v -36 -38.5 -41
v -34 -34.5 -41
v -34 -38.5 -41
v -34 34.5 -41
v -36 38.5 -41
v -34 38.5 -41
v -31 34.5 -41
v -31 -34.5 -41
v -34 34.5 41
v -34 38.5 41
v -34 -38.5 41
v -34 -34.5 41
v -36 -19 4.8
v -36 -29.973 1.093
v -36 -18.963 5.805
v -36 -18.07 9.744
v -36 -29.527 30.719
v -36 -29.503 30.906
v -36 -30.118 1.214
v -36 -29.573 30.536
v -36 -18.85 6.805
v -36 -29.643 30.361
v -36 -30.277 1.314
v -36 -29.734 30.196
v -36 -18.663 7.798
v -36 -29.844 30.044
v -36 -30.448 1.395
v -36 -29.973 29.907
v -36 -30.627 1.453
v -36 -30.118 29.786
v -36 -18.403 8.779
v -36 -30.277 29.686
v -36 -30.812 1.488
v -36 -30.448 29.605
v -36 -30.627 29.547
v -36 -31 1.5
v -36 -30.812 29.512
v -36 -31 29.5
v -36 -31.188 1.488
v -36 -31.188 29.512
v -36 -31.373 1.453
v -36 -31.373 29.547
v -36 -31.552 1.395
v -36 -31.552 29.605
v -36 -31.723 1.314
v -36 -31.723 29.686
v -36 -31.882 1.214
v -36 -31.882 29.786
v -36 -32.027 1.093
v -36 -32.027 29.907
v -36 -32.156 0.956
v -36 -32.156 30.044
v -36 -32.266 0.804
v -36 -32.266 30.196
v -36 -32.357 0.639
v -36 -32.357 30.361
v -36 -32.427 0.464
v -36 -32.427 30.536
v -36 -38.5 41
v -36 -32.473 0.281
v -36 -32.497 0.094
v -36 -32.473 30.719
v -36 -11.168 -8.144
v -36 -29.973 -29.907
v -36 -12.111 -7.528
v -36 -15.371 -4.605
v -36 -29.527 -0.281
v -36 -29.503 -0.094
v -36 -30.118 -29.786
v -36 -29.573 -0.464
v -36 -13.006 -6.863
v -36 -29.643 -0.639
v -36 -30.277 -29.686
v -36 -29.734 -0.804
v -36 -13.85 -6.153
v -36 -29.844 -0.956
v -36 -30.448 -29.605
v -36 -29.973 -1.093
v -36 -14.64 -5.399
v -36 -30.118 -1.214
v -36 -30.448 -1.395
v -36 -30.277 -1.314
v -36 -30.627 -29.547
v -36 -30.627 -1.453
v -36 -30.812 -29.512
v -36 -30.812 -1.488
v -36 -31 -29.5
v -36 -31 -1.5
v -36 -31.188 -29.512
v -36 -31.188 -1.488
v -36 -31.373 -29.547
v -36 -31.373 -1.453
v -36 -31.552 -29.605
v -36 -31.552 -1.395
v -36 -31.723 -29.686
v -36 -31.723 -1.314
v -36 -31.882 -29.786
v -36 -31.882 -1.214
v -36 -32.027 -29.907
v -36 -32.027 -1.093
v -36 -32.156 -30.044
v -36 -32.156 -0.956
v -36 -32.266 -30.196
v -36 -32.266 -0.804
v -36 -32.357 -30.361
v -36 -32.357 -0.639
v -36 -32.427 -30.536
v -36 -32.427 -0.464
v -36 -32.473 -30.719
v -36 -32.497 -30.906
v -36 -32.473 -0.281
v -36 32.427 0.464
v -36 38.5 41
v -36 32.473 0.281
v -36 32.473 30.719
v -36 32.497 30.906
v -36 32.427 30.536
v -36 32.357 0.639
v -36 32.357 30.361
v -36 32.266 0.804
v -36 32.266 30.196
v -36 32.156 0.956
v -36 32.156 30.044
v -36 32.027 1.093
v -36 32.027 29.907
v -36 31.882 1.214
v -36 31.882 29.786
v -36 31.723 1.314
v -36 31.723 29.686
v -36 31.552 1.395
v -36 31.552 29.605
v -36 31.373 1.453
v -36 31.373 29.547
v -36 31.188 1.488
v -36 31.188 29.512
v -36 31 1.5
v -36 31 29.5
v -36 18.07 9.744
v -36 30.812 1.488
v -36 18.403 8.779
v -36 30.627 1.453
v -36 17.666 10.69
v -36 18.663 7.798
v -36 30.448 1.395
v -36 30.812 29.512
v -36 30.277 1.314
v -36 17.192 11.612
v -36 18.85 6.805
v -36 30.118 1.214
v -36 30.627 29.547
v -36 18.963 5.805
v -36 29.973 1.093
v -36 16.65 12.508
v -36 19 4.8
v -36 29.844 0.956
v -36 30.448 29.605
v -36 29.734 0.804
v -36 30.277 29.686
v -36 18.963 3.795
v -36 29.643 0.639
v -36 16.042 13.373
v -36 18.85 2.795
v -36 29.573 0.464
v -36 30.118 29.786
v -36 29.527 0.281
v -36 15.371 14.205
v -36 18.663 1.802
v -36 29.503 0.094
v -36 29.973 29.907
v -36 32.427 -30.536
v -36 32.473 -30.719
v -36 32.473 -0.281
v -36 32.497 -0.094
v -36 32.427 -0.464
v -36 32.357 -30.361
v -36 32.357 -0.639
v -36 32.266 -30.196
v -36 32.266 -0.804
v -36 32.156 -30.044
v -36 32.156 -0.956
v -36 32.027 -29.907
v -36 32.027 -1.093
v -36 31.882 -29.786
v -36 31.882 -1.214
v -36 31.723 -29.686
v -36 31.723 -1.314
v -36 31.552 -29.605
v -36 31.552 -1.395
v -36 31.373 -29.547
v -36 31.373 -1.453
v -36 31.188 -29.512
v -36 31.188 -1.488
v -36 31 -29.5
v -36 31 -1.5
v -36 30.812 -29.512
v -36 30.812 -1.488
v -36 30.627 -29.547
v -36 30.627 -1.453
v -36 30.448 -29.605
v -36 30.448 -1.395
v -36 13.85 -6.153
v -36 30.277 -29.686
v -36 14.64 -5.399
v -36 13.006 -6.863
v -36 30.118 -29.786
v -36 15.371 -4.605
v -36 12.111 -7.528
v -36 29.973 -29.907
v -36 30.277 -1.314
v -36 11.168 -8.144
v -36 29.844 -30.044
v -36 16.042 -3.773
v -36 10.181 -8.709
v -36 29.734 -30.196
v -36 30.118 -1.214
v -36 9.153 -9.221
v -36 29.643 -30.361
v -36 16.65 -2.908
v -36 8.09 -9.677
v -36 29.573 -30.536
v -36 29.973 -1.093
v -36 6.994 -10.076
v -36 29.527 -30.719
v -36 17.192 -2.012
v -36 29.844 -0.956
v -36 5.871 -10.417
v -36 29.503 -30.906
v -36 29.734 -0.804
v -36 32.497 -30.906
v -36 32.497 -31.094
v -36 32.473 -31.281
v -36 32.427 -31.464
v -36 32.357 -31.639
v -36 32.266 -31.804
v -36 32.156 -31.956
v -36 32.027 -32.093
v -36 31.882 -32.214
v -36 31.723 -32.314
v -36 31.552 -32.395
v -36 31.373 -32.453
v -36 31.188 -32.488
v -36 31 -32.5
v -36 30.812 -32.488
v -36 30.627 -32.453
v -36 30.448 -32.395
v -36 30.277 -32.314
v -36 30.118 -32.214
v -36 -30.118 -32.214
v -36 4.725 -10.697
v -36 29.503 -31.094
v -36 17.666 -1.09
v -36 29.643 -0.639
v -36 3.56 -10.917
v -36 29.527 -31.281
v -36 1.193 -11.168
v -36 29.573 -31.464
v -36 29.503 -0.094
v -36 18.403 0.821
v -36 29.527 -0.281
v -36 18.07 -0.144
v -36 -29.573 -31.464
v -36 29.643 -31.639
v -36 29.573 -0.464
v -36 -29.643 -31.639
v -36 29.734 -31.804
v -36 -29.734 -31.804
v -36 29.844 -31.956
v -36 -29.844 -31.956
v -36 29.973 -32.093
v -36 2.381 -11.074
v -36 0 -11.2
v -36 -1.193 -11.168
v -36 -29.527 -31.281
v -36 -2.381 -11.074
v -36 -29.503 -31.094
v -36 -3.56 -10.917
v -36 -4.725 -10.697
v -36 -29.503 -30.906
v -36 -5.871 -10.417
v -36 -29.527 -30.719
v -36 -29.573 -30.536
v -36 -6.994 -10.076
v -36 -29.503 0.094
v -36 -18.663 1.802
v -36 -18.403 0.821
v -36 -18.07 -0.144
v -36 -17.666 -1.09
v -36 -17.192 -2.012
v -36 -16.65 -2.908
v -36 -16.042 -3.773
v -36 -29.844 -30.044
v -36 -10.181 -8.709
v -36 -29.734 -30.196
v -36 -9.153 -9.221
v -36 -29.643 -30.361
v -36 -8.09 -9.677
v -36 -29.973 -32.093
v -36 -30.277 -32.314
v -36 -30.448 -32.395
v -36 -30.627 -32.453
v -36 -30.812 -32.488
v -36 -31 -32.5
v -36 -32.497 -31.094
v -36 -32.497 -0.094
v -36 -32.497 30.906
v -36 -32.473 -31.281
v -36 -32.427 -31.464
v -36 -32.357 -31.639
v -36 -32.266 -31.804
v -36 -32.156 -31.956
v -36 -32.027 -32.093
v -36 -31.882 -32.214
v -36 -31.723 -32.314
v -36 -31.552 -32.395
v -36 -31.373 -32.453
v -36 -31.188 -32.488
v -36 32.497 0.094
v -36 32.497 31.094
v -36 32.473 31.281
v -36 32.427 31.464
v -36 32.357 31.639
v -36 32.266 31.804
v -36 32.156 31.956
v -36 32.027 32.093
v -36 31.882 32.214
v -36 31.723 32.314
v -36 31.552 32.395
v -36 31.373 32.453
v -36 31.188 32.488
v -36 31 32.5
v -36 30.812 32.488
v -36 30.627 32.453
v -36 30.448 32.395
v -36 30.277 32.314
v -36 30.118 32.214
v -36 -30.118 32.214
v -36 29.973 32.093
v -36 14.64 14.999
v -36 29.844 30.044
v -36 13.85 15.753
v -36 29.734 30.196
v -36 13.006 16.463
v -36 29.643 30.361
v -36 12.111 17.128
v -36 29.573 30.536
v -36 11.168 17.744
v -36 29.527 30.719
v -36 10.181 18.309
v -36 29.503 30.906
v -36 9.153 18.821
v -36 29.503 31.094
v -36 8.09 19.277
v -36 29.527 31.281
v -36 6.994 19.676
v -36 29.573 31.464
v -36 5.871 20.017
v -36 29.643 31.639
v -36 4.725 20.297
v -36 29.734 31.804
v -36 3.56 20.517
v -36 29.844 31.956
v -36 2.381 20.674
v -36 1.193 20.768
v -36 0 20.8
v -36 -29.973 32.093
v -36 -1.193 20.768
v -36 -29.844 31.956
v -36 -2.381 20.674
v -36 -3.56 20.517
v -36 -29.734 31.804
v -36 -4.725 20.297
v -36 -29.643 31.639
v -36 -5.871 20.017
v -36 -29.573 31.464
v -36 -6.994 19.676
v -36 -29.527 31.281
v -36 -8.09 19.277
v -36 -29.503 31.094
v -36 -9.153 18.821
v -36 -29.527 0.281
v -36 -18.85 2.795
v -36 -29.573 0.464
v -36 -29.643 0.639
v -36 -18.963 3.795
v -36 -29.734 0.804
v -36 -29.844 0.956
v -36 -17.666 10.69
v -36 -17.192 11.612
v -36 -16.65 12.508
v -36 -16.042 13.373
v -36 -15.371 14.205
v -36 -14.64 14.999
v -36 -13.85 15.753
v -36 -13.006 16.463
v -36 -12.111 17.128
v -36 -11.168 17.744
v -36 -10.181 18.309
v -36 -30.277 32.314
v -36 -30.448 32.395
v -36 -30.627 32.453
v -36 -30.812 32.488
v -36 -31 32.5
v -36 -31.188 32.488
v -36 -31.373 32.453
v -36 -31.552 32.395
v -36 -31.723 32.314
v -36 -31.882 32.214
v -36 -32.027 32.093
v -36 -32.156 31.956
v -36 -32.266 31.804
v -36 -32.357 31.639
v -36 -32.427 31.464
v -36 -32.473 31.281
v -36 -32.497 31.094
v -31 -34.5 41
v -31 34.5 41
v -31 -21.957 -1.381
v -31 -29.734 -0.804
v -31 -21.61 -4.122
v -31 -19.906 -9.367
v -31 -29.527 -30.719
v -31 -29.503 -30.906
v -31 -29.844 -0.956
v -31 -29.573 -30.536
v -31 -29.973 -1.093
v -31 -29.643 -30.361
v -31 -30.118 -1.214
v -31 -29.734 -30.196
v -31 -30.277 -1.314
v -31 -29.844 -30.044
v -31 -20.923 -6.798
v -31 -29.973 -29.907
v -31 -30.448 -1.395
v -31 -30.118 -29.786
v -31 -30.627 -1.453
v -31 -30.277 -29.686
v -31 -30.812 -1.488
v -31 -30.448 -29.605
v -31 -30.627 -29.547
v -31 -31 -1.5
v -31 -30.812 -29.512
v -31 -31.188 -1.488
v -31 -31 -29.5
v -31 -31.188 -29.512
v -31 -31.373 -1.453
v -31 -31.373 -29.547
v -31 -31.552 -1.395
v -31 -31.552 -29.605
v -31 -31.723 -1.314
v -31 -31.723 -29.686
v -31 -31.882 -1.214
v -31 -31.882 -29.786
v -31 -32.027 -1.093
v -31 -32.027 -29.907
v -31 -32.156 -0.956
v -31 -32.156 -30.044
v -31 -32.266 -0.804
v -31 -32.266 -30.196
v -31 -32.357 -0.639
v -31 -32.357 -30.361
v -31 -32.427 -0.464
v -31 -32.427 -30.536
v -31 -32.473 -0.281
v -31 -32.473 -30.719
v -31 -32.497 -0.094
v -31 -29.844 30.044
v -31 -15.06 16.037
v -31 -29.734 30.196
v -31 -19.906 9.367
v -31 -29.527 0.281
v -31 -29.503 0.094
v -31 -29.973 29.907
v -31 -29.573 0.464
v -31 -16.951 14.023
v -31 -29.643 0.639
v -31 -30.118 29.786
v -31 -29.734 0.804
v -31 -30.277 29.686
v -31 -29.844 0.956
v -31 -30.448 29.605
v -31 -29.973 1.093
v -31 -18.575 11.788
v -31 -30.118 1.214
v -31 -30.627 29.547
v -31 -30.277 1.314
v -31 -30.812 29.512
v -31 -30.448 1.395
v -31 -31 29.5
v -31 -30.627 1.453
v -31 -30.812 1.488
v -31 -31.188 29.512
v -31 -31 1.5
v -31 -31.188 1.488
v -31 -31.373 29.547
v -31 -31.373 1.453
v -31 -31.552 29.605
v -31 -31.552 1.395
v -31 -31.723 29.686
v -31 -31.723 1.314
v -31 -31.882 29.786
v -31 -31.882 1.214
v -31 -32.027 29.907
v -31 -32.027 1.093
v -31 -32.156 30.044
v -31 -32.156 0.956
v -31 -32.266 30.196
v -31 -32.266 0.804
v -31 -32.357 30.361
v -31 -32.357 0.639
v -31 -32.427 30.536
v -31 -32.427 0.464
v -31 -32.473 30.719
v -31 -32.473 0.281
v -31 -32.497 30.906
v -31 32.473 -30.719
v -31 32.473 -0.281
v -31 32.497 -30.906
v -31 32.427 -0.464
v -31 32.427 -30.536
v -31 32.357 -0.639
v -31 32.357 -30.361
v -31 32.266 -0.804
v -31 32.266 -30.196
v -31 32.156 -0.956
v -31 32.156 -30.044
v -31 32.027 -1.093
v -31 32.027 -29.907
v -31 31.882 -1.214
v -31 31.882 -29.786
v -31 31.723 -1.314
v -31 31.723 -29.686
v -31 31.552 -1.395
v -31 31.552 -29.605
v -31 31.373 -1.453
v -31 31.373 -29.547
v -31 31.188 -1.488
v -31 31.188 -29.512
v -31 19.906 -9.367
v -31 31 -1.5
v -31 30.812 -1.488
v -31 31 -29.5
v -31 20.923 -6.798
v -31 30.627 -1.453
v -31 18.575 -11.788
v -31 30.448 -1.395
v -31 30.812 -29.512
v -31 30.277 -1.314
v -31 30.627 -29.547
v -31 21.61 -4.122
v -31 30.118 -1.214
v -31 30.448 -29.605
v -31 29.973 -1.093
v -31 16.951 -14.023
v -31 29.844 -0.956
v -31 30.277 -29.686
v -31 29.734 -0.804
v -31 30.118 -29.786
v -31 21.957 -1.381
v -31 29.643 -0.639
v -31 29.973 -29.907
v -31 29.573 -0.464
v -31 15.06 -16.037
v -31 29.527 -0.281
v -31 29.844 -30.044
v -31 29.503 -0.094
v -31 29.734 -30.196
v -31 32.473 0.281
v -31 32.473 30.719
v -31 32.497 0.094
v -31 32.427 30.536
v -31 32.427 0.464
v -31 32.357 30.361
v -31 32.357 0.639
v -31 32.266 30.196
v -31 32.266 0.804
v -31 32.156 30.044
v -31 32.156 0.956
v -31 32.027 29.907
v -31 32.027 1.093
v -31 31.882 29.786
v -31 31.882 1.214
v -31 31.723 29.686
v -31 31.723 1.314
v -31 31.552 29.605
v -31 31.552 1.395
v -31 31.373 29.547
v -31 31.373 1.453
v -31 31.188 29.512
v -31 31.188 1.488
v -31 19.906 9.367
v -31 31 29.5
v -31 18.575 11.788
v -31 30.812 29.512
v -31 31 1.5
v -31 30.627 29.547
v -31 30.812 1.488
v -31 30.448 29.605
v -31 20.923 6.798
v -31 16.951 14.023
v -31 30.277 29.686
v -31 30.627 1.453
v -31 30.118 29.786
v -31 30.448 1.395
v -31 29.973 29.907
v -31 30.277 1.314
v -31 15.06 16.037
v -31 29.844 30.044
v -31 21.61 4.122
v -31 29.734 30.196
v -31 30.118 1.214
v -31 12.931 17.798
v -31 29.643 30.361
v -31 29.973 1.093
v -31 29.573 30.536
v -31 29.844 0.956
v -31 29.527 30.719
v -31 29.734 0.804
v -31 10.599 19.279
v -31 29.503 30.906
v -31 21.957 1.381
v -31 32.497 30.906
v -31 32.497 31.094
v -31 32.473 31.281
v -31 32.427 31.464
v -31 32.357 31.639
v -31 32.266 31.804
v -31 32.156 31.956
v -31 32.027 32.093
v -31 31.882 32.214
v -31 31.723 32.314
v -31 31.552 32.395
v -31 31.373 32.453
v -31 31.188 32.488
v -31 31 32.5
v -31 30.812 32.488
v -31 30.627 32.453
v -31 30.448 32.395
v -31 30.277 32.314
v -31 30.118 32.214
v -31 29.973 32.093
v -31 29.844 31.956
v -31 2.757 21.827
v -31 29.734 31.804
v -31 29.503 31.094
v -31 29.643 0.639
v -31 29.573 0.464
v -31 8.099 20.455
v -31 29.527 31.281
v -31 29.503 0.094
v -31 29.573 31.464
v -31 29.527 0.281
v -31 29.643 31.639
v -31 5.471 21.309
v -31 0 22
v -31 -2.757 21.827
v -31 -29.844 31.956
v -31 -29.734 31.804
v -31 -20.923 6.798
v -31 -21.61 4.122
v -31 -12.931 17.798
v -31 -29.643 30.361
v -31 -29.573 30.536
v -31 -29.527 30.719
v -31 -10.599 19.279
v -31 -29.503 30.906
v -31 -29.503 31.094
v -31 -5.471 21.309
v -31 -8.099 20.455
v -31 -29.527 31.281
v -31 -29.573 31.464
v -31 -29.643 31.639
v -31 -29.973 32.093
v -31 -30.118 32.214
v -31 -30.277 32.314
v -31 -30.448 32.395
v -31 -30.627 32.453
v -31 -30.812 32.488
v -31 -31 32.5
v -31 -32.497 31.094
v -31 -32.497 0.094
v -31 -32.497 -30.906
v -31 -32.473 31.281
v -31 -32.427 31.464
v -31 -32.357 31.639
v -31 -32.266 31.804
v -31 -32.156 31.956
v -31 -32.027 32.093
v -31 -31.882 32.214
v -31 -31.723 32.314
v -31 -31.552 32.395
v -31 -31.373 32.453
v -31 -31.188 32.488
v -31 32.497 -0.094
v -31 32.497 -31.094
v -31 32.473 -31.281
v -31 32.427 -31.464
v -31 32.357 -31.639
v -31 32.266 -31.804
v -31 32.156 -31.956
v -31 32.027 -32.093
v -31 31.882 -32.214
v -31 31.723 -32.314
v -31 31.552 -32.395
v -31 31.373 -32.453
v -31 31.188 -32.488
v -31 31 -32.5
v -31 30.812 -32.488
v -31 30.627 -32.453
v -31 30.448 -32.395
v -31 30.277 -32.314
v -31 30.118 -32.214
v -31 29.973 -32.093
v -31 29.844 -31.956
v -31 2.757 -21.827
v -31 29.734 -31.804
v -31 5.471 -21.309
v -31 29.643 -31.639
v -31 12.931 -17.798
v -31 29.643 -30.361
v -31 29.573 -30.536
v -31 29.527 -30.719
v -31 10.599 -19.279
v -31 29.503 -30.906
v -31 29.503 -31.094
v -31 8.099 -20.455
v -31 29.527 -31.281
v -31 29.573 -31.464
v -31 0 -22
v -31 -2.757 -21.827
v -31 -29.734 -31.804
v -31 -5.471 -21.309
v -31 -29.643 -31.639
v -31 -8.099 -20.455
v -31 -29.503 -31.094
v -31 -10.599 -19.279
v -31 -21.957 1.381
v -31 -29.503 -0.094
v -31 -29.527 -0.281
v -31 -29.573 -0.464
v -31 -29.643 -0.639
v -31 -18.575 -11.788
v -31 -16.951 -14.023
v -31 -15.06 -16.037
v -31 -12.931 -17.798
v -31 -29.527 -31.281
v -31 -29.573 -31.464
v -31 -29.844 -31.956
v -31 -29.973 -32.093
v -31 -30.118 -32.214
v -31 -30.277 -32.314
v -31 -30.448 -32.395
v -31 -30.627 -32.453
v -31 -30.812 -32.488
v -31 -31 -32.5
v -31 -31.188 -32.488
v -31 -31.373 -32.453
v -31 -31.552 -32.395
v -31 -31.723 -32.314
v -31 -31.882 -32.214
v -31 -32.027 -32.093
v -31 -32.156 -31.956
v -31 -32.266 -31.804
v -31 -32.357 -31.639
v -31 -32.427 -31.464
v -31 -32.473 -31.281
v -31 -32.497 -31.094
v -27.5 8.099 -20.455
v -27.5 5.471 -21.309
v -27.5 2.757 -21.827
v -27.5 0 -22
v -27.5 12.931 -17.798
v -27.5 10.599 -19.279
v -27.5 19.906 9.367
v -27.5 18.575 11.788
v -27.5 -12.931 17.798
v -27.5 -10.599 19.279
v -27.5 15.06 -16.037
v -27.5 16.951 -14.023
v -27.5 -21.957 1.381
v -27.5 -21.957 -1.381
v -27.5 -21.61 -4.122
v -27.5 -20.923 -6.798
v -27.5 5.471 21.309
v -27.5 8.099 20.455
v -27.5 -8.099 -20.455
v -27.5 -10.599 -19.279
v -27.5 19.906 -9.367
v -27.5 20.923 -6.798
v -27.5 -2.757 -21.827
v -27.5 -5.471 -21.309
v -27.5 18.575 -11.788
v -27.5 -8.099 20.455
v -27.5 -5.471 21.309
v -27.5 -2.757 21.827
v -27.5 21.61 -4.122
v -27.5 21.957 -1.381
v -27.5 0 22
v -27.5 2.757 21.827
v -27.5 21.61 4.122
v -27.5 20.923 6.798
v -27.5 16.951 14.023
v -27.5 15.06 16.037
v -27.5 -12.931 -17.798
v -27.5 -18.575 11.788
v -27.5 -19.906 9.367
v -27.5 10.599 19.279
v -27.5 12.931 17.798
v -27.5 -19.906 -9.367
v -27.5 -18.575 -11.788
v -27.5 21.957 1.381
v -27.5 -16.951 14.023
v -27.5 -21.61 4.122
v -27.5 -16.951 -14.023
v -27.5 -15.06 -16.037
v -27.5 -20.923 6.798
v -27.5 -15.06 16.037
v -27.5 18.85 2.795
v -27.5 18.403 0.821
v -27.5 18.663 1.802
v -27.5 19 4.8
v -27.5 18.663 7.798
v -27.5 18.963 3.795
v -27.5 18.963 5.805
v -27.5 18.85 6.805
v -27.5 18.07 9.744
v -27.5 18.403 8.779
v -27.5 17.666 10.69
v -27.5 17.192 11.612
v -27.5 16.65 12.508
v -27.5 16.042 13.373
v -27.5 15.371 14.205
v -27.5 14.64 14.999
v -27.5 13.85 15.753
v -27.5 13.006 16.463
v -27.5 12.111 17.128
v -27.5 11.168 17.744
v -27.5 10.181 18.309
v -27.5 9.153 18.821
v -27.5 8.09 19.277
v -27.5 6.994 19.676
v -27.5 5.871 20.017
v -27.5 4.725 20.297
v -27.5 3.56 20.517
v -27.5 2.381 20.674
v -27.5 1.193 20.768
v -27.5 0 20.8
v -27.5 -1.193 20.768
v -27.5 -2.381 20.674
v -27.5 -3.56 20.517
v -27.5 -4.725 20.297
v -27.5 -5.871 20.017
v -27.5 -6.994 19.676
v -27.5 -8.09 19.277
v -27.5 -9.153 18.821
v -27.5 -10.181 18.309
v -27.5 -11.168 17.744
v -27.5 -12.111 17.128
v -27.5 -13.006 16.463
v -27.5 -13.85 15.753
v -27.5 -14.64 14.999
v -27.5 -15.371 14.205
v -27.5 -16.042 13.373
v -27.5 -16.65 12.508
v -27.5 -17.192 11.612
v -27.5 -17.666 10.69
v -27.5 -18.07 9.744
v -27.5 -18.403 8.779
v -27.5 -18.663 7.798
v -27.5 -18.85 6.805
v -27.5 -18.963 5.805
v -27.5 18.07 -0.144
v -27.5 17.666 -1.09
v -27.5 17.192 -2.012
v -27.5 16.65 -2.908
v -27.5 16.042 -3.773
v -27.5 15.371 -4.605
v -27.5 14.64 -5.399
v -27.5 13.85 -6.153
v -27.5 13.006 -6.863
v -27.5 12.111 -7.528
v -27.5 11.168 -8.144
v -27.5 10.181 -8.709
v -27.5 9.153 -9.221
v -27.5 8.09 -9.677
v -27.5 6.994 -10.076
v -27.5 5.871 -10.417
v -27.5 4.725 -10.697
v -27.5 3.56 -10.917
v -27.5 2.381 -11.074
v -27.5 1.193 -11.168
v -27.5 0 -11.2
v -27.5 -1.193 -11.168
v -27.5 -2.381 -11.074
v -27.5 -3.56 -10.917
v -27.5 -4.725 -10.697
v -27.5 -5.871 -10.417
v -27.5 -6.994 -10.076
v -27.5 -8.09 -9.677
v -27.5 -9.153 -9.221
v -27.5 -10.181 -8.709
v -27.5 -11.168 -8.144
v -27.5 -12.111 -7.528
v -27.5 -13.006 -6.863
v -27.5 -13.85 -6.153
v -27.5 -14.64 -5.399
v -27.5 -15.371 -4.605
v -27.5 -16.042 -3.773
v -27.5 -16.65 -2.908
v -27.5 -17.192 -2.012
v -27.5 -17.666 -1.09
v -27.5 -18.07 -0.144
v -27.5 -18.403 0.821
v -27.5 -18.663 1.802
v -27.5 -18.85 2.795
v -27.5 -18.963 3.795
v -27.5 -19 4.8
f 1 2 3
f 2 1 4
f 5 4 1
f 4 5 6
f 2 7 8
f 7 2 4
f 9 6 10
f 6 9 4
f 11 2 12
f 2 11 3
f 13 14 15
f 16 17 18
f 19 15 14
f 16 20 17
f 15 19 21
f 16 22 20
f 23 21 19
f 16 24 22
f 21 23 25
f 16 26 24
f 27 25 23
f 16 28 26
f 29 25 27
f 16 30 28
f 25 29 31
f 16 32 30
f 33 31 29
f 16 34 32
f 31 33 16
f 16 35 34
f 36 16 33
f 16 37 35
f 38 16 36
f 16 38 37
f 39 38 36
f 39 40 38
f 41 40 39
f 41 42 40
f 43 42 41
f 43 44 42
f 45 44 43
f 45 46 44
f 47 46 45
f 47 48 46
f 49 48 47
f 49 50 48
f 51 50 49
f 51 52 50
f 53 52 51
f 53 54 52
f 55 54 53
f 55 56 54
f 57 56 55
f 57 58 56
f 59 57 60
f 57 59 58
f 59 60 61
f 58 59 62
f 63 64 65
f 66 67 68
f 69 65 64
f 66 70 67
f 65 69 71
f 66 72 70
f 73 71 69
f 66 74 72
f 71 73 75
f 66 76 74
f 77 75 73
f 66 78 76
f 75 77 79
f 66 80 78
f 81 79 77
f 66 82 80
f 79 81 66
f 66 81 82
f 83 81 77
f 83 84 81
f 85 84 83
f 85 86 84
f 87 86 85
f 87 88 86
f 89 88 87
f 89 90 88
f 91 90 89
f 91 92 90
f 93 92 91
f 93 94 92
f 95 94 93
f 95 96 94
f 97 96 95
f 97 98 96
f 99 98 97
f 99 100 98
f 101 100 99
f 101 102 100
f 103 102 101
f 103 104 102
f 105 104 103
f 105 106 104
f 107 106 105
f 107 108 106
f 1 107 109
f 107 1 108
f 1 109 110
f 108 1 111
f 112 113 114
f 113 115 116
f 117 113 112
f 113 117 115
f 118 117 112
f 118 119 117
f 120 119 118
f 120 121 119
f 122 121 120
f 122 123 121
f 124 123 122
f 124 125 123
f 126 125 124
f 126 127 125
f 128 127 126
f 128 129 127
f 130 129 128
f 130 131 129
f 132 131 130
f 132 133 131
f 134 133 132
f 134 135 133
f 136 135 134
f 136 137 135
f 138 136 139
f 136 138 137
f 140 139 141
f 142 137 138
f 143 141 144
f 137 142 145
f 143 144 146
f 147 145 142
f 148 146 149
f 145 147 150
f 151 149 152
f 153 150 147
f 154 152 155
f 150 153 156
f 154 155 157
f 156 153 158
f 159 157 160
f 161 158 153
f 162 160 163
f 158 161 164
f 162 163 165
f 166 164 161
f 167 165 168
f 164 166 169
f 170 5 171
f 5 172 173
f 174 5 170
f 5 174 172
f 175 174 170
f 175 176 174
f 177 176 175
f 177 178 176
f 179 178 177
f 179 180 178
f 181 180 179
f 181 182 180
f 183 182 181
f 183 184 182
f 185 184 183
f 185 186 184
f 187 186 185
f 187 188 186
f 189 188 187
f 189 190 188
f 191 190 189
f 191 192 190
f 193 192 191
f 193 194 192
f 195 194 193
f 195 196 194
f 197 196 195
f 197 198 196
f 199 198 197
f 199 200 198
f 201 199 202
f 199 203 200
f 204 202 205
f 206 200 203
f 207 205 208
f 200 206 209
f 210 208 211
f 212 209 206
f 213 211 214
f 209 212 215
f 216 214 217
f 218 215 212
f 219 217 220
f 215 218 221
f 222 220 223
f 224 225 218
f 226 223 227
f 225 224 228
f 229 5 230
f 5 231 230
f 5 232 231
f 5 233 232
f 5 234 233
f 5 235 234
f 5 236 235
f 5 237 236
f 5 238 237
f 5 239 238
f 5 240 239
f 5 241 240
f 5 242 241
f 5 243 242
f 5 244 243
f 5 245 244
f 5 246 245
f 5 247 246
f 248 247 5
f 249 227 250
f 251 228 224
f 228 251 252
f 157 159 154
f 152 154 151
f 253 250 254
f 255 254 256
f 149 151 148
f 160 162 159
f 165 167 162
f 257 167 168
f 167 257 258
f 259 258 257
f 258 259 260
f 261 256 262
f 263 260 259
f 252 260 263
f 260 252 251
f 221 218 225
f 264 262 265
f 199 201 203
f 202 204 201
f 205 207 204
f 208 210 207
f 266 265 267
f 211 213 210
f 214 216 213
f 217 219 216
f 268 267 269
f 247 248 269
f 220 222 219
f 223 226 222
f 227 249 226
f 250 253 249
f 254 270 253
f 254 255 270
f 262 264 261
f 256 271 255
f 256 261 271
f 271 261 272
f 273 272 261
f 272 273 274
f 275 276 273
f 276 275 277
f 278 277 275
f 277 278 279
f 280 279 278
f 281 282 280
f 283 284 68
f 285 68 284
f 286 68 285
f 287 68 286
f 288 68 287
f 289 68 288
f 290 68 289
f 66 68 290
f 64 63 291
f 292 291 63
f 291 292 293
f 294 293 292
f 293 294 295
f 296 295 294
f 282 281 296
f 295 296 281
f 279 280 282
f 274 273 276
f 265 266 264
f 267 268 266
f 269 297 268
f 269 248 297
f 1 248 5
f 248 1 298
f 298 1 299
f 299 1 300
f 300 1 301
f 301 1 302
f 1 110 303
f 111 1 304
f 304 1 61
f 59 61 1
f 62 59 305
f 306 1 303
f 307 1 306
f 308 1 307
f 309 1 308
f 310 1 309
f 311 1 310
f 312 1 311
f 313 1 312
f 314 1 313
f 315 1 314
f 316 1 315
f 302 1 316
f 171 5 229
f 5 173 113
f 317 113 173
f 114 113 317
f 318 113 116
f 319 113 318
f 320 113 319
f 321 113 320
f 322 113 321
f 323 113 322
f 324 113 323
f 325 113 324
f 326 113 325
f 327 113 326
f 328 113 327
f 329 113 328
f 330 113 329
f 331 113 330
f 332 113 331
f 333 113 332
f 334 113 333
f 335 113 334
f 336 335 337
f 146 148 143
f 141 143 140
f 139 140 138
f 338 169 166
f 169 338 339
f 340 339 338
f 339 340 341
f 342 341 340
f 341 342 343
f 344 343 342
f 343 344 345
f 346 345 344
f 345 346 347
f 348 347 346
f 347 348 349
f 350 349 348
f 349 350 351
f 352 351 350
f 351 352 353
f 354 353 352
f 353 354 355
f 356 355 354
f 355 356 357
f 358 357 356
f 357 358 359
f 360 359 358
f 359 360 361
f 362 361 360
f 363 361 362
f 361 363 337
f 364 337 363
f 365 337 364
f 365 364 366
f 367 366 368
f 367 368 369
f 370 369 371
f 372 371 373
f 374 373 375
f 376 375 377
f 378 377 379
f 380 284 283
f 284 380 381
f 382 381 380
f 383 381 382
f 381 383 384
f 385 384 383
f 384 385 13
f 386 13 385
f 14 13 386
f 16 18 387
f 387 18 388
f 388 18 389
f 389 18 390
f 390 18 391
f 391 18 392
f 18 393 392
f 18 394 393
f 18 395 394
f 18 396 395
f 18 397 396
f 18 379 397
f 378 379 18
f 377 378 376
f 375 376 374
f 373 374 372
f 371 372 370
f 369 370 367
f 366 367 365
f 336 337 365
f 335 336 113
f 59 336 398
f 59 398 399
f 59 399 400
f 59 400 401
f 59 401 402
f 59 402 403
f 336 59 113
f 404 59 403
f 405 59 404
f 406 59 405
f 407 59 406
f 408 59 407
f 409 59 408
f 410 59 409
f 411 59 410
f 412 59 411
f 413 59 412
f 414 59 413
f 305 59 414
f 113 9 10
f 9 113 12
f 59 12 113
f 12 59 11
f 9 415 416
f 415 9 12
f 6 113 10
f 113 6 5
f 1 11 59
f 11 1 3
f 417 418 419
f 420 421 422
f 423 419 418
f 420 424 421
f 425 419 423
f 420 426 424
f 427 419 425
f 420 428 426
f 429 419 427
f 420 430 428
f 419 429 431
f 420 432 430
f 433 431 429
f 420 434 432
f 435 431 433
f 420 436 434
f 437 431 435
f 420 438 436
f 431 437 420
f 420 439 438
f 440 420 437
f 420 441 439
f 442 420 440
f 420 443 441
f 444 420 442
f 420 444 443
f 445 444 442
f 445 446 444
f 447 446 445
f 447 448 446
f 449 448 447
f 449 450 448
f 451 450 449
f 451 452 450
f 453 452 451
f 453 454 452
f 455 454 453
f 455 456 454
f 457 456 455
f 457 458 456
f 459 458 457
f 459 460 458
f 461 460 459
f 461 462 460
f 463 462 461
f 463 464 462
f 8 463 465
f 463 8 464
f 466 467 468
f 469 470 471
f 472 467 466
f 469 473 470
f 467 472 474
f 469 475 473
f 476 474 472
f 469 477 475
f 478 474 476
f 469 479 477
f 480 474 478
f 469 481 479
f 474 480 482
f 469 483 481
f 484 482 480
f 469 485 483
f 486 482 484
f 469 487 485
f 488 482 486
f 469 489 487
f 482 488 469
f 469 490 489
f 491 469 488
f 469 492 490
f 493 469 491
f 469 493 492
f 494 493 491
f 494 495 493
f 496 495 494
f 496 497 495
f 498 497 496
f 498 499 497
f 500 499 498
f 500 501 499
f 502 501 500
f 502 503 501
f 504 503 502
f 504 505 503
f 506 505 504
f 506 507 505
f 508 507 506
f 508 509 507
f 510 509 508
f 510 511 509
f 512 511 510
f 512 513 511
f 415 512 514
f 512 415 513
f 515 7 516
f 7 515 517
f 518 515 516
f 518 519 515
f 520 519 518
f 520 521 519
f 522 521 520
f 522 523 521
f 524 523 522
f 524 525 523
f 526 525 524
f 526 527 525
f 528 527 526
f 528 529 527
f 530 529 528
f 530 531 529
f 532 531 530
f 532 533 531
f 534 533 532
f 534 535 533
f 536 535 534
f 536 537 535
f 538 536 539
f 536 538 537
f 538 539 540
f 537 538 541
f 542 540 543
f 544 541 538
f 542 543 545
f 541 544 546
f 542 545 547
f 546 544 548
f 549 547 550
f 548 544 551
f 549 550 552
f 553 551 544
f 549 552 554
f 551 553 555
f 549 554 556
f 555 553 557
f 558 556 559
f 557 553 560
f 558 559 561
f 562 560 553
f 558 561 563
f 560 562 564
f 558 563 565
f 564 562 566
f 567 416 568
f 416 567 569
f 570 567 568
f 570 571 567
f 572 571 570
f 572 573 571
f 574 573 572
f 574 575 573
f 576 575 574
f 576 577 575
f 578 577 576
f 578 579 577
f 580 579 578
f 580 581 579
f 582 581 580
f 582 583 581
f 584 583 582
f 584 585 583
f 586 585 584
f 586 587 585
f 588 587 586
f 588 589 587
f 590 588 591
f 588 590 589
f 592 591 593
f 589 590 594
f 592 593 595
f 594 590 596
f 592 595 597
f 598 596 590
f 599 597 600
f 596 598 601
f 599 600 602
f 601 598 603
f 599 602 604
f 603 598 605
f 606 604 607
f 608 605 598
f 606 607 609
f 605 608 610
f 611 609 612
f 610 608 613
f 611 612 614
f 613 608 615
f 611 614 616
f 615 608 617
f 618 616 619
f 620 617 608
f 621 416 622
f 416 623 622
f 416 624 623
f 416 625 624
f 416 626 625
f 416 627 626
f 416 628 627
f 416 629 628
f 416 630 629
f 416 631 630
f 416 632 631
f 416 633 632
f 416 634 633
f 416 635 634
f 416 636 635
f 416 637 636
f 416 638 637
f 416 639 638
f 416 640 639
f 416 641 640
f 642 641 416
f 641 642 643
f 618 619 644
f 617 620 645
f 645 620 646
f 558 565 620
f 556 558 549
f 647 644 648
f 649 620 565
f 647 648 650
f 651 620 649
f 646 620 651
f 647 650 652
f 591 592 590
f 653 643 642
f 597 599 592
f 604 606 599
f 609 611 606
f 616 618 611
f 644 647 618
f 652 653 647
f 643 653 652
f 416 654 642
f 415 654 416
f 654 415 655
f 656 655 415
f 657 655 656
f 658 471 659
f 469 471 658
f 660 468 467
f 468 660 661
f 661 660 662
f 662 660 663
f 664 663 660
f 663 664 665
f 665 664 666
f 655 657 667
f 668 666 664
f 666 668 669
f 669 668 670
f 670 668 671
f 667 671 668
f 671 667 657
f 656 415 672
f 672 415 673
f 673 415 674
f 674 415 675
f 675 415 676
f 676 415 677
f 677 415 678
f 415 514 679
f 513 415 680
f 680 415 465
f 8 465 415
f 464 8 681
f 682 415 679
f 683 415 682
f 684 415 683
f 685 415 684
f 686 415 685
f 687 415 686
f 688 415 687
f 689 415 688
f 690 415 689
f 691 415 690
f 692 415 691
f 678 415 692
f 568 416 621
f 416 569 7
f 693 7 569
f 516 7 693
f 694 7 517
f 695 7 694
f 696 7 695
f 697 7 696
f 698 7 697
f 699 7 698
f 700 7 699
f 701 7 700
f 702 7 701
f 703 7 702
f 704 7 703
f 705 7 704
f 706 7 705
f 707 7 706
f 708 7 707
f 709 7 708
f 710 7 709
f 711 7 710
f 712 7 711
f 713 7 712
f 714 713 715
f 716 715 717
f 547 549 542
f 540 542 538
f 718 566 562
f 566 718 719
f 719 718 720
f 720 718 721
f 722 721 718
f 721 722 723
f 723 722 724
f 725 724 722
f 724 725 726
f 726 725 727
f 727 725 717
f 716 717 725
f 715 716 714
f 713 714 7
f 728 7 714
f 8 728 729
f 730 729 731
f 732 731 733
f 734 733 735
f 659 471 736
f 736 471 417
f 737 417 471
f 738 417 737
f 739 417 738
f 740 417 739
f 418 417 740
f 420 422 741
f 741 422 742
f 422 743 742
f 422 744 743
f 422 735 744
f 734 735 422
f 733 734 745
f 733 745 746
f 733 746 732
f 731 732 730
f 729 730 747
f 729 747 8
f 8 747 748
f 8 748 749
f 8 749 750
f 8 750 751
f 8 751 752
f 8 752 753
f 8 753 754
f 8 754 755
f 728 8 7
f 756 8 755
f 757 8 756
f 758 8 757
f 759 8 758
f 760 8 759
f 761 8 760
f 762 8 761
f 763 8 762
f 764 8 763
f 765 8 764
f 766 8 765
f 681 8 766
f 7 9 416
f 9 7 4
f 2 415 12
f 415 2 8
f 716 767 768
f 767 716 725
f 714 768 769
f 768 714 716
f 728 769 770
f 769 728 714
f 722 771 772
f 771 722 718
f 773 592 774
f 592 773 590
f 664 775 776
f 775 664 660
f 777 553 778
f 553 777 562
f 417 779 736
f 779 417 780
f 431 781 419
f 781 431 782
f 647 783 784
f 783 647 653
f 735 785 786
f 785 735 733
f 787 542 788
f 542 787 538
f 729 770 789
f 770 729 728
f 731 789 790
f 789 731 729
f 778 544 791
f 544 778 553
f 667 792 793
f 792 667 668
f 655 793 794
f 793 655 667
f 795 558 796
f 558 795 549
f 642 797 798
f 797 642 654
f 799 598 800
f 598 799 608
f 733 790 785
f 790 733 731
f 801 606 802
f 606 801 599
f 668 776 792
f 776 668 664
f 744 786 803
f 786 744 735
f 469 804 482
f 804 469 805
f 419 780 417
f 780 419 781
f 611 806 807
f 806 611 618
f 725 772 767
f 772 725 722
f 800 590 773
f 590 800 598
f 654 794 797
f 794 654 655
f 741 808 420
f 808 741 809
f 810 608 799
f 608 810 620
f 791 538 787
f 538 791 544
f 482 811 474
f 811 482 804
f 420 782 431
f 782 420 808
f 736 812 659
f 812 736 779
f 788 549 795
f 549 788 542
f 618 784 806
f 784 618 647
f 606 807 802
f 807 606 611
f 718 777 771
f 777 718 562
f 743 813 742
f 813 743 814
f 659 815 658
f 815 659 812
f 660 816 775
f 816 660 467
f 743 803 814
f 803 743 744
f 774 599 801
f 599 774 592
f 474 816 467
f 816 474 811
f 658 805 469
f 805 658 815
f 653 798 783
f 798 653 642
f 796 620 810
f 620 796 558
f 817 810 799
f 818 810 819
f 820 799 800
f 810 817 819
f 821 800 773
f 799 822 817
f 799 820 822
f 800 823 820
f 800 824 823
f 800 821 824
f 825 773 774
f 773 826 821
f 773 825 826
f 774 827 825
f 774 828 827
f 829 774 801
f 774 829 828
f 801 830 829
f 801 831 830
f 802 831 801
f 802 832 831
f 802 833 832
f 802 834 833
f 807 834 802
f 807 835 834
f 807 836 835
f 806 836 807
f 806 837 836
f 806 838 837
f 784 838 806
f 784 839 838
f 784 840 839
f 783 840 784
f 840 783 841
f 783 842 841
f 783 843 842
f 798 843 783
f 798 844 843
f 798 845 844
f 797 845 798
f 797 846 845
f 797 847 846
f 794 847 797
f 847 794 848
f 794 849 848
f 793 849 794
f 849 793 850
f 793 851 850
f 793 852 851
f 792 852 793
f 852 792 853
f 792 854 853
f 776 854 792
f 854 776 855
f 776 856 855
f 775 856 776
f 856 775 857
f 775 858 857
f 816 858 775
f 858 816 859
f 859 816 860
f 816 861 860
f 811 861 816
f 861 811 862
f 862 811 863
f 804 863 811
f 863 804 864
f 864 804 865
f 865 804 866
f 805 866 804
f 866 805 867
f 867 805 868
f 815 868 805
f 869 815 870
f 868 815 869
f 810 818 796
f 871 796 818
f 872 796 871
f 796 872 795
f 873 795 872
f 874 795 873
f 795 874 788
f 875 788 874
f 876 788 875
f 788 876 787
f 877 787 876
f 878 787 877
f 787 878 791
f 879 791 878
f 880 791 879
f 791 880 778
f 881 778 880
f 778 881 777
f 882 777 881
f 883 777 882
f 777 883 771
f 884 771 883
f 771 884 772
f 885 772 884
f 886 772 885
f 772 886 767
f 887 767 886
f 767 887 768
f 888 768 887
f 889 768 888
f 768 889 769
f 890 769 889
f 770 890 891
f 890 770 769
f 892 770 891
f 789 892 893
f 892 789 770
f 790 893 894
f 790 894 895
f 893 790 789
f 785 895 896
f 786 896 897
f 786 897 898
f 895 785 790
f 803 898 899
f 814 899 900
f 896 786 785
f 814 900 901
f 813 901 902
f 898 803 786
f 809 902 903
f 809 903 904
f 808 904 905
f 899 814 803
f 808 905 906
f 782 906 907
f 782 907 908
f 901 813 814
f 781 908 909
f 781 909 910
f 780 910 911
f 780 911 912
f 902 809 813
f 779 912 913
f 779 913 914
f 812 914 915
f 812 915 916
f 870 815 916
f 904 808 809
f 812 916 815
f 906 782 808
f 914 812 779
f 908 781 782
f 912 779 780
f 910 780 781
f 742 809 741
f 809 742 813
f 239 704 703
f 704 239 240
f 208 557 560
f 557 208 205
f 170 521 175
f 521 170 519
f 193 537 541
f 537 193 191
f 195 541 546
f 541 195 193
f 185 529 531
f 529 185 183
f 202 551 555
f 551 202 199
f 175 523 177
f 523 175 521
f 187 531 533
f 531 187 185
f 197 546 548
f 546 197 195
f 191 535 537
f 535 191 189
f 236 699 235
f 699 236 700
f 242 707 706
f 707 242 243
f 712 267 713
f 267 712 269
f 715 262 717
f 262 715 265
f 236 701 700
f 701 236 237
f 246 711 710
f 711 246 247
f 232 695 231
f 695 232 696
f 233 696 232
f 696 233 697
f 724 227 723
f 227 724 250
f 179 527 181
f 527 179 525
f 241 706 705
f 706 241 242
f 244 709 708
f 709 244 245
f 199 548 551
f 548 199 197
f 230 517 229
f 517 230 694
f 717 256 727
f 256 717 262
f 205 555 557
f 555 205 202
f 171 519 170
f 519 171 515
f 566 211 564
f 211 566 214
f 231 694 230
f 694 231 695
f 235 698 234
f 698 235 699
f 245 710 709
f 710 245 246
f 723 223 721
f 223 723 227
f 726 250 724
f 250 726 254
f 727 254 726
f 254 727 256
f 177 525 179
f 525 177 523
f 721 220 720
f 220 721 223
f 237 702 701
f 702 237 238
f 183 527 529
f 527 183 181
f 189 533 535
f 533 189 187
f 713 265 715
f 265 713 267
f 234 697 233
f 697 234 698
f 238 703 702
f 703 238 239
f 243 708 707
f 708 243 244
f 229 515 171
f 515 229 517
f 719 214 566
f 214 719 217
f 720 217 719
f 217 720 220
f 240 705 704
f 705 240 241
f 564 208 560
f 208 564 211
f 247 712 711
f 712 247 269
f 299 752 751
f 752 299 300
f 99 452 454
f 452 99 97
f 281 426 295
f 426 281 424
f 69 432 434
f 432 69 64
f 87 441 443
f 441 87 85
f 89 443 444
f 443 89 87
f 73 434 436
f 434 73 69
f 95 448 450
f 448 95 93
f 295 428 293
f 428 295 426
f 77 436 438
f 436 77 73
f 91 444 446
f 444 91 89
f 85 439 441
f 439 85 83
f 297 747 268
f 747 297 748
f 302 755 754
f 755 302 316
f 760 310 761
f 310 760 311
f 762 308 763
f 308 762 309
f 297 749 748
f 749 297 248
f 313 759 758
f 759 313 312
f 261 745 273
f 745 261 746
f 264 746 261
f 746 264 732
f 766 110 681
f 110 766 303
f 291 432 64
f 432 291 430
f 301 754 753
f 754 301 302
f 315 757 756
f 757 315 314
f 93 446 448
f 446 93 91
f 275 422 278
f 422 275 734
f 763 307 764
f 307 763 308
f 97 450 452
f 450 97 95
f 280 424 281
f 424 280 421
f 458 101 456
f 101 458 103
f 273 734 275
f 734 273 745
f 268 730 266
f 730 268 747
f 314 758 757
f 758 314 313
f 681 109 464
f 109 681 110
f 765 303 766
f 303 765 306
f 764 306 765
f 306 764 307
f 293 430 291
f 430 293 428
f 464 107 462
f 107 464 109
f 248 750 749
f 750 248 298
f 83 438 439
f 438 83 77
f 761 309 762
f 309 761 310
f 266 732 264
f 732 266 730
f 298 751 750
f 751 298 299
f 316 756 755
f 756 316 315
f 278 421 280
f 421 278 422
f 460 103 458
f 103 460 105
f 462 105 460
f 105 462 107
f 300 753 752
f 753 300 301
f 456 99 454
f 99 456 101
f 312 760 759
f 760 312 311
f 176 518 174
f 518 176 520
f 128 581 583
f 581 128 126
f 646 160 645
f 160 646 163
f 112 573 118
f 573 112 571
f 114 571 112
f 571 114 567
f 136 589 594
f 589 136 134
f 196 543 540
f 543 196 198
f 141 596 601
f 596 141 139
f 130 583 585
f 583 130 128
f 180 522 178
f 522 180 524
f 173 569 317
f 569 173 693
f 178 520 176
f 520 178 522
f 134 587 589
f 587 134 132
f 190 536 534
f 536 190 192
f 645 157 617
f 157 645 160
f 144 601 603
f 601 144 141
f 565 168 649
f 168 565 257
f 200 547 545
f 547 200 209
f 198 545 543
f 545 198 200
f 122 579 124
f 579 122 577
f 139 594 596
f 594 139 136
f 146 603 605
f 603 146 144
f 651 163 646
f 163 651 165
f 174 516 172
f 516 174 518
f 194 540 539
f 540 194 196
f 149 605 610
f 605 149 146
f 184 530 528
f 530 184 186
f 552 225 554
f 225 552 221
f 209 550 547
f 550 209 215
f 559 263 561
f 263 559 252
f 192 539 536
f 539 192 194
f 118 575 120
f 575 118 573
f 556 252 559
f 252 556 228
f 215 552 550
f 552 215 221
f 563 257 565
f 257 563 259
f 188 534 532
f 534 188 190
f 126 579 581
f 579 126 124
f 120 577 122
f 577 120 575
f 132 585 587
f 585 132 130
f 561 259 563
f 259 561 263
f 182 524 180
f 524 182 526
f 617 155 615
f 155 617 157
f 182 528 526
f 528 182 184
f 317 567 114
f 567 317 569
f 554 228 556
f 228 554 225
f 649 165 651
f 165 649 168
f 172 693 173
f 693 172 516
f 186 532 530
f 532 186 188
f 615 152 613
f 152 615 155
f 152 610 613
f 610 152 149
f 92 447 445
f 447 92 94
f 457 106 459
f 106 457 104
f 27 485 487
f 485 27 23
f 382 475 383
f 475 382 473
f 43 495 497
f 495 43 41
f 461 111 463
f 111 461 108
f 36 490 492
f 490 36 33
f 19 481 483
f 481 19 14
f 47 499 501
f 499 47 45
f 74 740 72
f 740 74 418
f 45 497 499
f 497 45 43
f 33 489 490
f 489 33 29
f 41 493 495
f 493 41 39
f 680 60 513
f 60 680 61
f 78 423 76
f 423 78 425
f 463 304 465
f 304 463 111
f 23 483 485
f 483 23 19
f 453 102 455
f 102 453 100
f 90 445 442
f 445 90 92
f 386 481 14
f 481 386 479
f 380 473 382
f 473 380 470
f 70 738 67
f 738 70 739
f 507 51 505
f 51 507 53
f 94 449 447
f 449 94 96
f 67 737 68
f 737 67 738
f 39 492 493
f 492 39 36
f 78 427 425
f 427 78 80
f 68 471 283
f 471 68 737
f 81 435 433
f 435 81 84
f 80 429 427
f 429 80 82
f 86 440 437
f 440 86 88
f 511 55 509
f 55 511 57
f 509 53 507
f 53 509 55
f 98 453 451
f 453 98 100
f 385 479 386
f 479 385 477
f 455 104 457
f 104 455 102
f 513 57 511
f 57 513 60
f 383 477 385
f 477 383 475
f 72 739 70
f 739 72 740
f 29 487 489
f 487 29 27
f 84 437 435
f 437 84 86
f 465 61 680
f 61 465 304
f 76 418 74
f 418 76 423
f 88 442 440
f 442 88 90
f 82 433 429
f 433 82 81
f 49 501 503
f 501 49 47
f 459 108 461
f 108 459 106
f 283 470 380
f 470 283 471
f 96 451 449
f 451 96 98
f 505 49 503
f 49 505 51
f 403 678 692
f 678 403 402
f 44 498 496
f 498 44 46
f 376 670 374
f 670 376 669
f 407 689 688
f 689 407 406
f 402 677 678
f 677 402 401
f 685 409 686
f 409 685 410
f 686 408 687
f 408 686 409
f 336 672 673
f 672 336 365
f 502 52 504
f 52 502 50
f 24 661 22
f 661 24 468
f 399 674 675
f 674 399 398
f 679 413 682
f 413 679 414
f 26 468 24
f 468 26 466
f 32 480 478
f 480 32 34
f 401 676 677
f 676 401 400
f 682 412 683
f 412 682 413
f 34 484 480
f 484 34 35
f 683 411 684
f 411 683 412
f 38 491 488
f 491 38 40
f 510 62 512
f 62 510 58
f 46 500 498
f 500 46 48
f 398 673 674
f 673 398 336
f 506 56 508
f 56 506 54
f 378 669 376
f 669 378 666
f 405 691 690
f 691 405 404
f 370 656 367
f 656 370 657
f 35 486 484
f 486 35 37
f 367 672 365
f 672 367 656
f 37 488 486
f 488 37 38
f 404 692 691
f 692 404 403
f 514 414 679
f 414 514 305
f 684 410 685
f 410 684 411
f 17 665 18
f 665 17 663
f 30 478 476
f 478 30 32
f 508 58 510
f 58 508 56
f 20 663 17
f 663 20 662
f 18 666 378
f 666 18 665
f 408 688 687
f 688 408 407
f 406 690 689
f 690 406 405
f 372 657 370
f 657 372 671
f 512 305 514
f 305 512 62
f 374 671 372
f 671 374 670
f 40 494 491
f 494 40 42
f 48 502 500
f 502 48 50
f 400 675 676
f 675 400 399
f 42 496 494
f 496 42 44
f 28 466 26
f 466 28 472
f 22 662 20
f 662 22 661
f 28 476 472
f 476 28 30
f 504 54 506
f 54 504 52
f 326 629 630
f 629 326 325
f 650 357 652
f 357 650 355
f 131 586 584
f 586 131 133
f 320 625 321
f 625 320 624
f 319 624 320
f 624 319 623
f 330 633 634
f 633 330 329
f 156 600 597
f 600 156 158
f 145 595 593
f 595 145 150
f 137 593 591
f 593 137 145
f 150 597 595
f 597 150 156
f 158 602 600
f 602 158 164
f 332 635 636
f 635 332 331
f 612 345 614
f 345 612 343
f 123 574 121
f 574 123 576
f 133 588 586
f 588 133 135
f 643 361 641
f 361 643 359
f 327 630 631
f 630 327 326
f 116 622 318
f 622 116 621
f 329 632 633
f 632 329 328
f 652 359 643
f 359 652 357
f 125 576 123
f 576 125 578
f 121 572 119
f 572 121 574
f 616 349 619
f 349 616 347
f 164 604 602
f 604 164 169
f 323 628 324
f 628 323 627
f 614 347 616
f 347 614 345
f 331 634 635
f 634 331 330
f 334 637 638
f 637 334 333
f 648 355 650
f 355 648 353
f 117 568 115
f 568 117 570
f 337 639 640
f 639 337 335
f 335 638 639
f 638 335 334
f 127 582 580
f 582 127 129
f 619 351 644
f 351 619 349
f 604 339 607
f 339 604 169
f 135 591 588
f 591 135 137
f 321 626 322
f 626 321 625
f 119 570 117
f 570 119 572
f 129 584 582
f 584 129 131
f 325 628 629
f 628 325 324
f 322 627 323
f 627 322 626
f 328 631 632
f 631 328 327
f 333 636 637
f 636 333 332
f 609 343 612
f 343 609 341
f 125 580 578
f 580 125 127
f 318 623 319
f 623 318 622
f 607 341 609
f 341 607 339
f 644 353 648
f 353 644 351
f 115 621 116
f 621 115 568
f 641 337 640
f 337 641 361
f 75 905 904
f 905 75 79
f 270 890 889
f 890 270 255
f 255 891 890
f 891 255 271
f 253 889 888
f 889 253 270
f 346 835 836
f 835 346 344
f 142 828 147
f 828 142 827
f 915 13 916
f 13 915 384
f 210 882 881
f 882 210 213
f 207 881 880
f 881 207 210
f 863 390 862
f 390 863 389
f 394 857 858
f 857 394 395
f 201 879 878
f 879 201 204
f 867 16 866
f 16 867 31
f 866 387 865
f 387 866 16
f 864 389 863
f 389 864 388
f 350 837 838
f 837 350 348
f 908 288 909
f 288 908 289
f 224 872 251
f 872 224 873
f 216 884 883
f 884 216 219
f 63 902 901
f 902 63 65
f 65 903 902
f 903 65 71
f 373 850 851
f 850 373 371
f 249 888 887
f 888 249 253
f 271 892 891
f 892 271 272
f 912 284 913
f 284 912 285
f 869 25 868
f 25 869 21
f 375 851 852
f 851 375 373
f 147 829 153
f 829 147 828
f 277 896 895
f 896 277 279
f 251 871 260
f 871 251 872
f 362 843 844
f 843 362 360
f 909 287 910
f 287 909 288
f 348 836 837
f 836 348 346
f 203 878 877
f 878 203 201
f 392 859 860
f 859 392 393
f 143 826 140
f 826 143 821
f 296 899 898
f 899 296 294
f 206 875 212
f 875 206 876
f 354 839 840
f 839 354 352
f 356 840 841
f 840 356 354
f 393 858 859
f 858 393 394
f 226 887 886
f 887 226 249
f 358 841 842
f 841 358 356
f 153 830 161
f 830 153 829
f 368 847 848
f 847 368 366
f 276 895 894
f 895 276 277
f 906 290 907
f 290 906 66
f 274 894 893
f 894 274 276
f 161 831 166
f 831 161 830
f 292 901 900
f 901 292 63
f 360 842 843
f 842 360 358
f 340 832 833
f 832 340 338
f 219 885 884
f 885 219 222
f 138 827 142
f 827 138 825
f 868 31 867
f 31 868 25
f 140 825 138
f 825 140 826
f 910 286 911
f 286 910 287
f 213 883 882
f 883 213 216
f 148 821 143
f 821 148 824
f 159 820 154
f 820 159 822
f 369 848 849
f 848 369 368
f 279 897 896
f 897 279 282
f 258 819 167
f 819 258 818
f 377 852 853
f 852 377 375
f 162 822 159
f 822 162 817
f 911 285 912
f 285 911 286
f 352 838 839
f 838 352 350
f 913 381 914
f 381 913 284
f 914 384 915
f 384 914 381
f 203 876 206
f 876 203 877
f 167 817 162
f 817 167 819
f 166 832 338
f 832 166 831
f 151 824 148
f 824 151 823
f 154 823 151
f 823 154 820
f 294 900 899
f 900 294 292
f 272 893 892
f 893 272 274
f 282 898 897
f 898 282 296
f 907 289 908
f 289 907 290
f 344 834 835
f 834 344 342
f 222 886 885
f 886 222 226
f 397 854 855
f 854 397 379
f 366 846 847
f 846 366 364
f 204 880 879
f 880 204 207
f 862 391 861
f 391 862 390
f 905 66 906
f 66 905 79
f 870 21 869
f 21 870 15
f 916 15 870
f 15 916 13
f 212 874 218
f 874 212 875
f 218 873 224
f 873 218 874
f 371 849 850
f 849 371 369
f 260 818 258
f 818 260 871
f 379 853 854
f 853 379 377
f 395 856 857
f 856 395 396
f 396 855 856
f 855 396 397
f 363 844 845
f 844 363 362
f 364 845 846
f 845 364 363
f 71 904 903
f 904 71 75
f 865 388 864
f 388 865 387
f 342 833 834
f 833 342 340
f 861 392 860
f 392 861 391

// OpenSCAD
$fn=50;

module screw(){
	translate([-30,0,0])rotate([0,90,0]) cylinder(r=1.50, h=35,center=true);
}

module screwset(){
	dist=31;
  	translate([0,dist,dist])screw();
    translate([0,-dist,dist])screw();
	translate([0,dist,0])screw();
	translate([0,-dist,0])screw();
  	translate([0,-dist,-dist])screw();
  	translate([0,dist,-dist])screw();

}


dia=23; // of the antenna

module antenna_cover(){
	difference(){
		union(){
			cylinder(r=dia+4,h=6,center=true);
			cube([6,dia*2+22,6],center=true);
		}
		translate([0,0,-1])cylinder(r=dia+2,h=5,center=true);
		cylinder(r=dia-2,h=7,center=true);
		translate([0,0,30])rotate([0,-90,0])screwset();
        translate([5,0,-2])cube([2,80,2],center=true);
	}
}

module rfid_board_hook(){
	distance=25;
    stickout=36;
    x=23;
	translate([x,stickout,distance]) cube([3,4,4],center=true);
	translate([x,stickout,-distance]) cube([3,4,4],center=true);
	translate([x,-stickout,distance]) cube([3,4,5],center=true);
	translate([x,-stickout,-distance]) cube([3,4,5],center=true);
}


module cboard_cover(){
	difference(){
		union(){
			translate([15,43,0])cube([30,12,63],center=true);
			translate([15,37,0])cube([30,4,70],center=true);
		}
		translate([15,40,0])cube([26,10,58],center=true);
		translate([18,38,0])cube([26,7,10],center=true);
		translate([15,35,0])cboard_screw(dia=2);
	}
}

module spoutholder(){
    rfid_board_hook();
	difference(){
        union(){
            cube([60,70,70],center=true); //outside
            translate([13,0,28])rotate([0,35,0])cube([20,30,30],center=true); // plate for spout
        }
		translate([-14,0,0])screwset();
		translate([-14,0,0])rotate([0,90,0])cylinder(r=dia-3,h=35,center=true);//rfid ring
		translate([-20,0,0])cube([55,60,56],center=true); //front chamber
		translate([20.1,0,-15])cube([20,50,80],center=true); //back chamber
		translate([-25,0,0])cube([10,80,56],center=true);//side slot
		translate([-12,11,-29])rotate([4,0,0])cube([40,27,6.2],center=true);//bottom
		translate([-12,-11,-29])rotate([-4,0,0])cube([40,27,6.2],center=true);//bottom
        translate([-14,0,5])rotate([0,0,90])union(){  // spout assembly
			translate([0,-10,0]) rotate([0,90,0]) cylinder(r=2.5, h=75,center=true); //holes for alignment of the spout tip 			
			translate([0,-10,0]) rotate([35,0,0]) cylinder(r=4.6, h=55); // location of the spout 
			translate([0,-42,31]) rotate([-55, 0,0]) cube([8.4, 18, 4.1], center=true);// hex screw for spout 
			translate([0,-60,14]) rotate([-55,0,0]) cylinder(r=1.9, h=50); //screw hole for tightening the spout 
   			translate([0,-10,-60]) cylinder(r=5, h=40); //hole for collection tube //yes
		}
		translate([15,35,0])cboard_screw();
		translate([0,0,30])cylinder(r=2.8,h=20,center=true);//cue light
		translate([-8,0,30])cylinder(r=2.8,h=20,center=true);//cue light
	}
}

module cboard_screw(dia=1.5){
	distance=32;
	translate([0,0,distance])rotate([90,0,0]) cylinder(r=dia, h=350,center=true);
	translate([0,0,-distance])rotate([90,0,0]) cylinder(r=dia, h=350,center=true);
	translate([0,19,-distance])rotate([90,0,0]) cylinder(r=dia+3, h=30,center=true); // screw head
	translate([0,19,distance])rotate([90,0,0]) cylinder(r=dia+3, h=30,center=true); // screw head
}

module frontpanel(){
    difference(){
        union(){
            cube([82,77,2],center=true);
            translate([0,0,2.5])cube([82,69,3],center=true);
            translate([0,0,5])cylinder(r=dia-1,h=5,center=true);
        }
  		//translate([0,0,4])cylinder(r=dia-3,h=14,center=true);
     	scale([.8,.95,1])translate([-6,0,4])cylinder(r=dia-3,h=14,center=true,$fn=100);
        translate([0,0,-20])rotate([0,90,0])screwset();
    }
}


translate([-35,0,0])rotate([0,90,0])frontpanel();
//translate([-30,0,0])rotate([0,90,0])antenna_cover();
//spoutholder();
//color("blue")cboard_cover();
